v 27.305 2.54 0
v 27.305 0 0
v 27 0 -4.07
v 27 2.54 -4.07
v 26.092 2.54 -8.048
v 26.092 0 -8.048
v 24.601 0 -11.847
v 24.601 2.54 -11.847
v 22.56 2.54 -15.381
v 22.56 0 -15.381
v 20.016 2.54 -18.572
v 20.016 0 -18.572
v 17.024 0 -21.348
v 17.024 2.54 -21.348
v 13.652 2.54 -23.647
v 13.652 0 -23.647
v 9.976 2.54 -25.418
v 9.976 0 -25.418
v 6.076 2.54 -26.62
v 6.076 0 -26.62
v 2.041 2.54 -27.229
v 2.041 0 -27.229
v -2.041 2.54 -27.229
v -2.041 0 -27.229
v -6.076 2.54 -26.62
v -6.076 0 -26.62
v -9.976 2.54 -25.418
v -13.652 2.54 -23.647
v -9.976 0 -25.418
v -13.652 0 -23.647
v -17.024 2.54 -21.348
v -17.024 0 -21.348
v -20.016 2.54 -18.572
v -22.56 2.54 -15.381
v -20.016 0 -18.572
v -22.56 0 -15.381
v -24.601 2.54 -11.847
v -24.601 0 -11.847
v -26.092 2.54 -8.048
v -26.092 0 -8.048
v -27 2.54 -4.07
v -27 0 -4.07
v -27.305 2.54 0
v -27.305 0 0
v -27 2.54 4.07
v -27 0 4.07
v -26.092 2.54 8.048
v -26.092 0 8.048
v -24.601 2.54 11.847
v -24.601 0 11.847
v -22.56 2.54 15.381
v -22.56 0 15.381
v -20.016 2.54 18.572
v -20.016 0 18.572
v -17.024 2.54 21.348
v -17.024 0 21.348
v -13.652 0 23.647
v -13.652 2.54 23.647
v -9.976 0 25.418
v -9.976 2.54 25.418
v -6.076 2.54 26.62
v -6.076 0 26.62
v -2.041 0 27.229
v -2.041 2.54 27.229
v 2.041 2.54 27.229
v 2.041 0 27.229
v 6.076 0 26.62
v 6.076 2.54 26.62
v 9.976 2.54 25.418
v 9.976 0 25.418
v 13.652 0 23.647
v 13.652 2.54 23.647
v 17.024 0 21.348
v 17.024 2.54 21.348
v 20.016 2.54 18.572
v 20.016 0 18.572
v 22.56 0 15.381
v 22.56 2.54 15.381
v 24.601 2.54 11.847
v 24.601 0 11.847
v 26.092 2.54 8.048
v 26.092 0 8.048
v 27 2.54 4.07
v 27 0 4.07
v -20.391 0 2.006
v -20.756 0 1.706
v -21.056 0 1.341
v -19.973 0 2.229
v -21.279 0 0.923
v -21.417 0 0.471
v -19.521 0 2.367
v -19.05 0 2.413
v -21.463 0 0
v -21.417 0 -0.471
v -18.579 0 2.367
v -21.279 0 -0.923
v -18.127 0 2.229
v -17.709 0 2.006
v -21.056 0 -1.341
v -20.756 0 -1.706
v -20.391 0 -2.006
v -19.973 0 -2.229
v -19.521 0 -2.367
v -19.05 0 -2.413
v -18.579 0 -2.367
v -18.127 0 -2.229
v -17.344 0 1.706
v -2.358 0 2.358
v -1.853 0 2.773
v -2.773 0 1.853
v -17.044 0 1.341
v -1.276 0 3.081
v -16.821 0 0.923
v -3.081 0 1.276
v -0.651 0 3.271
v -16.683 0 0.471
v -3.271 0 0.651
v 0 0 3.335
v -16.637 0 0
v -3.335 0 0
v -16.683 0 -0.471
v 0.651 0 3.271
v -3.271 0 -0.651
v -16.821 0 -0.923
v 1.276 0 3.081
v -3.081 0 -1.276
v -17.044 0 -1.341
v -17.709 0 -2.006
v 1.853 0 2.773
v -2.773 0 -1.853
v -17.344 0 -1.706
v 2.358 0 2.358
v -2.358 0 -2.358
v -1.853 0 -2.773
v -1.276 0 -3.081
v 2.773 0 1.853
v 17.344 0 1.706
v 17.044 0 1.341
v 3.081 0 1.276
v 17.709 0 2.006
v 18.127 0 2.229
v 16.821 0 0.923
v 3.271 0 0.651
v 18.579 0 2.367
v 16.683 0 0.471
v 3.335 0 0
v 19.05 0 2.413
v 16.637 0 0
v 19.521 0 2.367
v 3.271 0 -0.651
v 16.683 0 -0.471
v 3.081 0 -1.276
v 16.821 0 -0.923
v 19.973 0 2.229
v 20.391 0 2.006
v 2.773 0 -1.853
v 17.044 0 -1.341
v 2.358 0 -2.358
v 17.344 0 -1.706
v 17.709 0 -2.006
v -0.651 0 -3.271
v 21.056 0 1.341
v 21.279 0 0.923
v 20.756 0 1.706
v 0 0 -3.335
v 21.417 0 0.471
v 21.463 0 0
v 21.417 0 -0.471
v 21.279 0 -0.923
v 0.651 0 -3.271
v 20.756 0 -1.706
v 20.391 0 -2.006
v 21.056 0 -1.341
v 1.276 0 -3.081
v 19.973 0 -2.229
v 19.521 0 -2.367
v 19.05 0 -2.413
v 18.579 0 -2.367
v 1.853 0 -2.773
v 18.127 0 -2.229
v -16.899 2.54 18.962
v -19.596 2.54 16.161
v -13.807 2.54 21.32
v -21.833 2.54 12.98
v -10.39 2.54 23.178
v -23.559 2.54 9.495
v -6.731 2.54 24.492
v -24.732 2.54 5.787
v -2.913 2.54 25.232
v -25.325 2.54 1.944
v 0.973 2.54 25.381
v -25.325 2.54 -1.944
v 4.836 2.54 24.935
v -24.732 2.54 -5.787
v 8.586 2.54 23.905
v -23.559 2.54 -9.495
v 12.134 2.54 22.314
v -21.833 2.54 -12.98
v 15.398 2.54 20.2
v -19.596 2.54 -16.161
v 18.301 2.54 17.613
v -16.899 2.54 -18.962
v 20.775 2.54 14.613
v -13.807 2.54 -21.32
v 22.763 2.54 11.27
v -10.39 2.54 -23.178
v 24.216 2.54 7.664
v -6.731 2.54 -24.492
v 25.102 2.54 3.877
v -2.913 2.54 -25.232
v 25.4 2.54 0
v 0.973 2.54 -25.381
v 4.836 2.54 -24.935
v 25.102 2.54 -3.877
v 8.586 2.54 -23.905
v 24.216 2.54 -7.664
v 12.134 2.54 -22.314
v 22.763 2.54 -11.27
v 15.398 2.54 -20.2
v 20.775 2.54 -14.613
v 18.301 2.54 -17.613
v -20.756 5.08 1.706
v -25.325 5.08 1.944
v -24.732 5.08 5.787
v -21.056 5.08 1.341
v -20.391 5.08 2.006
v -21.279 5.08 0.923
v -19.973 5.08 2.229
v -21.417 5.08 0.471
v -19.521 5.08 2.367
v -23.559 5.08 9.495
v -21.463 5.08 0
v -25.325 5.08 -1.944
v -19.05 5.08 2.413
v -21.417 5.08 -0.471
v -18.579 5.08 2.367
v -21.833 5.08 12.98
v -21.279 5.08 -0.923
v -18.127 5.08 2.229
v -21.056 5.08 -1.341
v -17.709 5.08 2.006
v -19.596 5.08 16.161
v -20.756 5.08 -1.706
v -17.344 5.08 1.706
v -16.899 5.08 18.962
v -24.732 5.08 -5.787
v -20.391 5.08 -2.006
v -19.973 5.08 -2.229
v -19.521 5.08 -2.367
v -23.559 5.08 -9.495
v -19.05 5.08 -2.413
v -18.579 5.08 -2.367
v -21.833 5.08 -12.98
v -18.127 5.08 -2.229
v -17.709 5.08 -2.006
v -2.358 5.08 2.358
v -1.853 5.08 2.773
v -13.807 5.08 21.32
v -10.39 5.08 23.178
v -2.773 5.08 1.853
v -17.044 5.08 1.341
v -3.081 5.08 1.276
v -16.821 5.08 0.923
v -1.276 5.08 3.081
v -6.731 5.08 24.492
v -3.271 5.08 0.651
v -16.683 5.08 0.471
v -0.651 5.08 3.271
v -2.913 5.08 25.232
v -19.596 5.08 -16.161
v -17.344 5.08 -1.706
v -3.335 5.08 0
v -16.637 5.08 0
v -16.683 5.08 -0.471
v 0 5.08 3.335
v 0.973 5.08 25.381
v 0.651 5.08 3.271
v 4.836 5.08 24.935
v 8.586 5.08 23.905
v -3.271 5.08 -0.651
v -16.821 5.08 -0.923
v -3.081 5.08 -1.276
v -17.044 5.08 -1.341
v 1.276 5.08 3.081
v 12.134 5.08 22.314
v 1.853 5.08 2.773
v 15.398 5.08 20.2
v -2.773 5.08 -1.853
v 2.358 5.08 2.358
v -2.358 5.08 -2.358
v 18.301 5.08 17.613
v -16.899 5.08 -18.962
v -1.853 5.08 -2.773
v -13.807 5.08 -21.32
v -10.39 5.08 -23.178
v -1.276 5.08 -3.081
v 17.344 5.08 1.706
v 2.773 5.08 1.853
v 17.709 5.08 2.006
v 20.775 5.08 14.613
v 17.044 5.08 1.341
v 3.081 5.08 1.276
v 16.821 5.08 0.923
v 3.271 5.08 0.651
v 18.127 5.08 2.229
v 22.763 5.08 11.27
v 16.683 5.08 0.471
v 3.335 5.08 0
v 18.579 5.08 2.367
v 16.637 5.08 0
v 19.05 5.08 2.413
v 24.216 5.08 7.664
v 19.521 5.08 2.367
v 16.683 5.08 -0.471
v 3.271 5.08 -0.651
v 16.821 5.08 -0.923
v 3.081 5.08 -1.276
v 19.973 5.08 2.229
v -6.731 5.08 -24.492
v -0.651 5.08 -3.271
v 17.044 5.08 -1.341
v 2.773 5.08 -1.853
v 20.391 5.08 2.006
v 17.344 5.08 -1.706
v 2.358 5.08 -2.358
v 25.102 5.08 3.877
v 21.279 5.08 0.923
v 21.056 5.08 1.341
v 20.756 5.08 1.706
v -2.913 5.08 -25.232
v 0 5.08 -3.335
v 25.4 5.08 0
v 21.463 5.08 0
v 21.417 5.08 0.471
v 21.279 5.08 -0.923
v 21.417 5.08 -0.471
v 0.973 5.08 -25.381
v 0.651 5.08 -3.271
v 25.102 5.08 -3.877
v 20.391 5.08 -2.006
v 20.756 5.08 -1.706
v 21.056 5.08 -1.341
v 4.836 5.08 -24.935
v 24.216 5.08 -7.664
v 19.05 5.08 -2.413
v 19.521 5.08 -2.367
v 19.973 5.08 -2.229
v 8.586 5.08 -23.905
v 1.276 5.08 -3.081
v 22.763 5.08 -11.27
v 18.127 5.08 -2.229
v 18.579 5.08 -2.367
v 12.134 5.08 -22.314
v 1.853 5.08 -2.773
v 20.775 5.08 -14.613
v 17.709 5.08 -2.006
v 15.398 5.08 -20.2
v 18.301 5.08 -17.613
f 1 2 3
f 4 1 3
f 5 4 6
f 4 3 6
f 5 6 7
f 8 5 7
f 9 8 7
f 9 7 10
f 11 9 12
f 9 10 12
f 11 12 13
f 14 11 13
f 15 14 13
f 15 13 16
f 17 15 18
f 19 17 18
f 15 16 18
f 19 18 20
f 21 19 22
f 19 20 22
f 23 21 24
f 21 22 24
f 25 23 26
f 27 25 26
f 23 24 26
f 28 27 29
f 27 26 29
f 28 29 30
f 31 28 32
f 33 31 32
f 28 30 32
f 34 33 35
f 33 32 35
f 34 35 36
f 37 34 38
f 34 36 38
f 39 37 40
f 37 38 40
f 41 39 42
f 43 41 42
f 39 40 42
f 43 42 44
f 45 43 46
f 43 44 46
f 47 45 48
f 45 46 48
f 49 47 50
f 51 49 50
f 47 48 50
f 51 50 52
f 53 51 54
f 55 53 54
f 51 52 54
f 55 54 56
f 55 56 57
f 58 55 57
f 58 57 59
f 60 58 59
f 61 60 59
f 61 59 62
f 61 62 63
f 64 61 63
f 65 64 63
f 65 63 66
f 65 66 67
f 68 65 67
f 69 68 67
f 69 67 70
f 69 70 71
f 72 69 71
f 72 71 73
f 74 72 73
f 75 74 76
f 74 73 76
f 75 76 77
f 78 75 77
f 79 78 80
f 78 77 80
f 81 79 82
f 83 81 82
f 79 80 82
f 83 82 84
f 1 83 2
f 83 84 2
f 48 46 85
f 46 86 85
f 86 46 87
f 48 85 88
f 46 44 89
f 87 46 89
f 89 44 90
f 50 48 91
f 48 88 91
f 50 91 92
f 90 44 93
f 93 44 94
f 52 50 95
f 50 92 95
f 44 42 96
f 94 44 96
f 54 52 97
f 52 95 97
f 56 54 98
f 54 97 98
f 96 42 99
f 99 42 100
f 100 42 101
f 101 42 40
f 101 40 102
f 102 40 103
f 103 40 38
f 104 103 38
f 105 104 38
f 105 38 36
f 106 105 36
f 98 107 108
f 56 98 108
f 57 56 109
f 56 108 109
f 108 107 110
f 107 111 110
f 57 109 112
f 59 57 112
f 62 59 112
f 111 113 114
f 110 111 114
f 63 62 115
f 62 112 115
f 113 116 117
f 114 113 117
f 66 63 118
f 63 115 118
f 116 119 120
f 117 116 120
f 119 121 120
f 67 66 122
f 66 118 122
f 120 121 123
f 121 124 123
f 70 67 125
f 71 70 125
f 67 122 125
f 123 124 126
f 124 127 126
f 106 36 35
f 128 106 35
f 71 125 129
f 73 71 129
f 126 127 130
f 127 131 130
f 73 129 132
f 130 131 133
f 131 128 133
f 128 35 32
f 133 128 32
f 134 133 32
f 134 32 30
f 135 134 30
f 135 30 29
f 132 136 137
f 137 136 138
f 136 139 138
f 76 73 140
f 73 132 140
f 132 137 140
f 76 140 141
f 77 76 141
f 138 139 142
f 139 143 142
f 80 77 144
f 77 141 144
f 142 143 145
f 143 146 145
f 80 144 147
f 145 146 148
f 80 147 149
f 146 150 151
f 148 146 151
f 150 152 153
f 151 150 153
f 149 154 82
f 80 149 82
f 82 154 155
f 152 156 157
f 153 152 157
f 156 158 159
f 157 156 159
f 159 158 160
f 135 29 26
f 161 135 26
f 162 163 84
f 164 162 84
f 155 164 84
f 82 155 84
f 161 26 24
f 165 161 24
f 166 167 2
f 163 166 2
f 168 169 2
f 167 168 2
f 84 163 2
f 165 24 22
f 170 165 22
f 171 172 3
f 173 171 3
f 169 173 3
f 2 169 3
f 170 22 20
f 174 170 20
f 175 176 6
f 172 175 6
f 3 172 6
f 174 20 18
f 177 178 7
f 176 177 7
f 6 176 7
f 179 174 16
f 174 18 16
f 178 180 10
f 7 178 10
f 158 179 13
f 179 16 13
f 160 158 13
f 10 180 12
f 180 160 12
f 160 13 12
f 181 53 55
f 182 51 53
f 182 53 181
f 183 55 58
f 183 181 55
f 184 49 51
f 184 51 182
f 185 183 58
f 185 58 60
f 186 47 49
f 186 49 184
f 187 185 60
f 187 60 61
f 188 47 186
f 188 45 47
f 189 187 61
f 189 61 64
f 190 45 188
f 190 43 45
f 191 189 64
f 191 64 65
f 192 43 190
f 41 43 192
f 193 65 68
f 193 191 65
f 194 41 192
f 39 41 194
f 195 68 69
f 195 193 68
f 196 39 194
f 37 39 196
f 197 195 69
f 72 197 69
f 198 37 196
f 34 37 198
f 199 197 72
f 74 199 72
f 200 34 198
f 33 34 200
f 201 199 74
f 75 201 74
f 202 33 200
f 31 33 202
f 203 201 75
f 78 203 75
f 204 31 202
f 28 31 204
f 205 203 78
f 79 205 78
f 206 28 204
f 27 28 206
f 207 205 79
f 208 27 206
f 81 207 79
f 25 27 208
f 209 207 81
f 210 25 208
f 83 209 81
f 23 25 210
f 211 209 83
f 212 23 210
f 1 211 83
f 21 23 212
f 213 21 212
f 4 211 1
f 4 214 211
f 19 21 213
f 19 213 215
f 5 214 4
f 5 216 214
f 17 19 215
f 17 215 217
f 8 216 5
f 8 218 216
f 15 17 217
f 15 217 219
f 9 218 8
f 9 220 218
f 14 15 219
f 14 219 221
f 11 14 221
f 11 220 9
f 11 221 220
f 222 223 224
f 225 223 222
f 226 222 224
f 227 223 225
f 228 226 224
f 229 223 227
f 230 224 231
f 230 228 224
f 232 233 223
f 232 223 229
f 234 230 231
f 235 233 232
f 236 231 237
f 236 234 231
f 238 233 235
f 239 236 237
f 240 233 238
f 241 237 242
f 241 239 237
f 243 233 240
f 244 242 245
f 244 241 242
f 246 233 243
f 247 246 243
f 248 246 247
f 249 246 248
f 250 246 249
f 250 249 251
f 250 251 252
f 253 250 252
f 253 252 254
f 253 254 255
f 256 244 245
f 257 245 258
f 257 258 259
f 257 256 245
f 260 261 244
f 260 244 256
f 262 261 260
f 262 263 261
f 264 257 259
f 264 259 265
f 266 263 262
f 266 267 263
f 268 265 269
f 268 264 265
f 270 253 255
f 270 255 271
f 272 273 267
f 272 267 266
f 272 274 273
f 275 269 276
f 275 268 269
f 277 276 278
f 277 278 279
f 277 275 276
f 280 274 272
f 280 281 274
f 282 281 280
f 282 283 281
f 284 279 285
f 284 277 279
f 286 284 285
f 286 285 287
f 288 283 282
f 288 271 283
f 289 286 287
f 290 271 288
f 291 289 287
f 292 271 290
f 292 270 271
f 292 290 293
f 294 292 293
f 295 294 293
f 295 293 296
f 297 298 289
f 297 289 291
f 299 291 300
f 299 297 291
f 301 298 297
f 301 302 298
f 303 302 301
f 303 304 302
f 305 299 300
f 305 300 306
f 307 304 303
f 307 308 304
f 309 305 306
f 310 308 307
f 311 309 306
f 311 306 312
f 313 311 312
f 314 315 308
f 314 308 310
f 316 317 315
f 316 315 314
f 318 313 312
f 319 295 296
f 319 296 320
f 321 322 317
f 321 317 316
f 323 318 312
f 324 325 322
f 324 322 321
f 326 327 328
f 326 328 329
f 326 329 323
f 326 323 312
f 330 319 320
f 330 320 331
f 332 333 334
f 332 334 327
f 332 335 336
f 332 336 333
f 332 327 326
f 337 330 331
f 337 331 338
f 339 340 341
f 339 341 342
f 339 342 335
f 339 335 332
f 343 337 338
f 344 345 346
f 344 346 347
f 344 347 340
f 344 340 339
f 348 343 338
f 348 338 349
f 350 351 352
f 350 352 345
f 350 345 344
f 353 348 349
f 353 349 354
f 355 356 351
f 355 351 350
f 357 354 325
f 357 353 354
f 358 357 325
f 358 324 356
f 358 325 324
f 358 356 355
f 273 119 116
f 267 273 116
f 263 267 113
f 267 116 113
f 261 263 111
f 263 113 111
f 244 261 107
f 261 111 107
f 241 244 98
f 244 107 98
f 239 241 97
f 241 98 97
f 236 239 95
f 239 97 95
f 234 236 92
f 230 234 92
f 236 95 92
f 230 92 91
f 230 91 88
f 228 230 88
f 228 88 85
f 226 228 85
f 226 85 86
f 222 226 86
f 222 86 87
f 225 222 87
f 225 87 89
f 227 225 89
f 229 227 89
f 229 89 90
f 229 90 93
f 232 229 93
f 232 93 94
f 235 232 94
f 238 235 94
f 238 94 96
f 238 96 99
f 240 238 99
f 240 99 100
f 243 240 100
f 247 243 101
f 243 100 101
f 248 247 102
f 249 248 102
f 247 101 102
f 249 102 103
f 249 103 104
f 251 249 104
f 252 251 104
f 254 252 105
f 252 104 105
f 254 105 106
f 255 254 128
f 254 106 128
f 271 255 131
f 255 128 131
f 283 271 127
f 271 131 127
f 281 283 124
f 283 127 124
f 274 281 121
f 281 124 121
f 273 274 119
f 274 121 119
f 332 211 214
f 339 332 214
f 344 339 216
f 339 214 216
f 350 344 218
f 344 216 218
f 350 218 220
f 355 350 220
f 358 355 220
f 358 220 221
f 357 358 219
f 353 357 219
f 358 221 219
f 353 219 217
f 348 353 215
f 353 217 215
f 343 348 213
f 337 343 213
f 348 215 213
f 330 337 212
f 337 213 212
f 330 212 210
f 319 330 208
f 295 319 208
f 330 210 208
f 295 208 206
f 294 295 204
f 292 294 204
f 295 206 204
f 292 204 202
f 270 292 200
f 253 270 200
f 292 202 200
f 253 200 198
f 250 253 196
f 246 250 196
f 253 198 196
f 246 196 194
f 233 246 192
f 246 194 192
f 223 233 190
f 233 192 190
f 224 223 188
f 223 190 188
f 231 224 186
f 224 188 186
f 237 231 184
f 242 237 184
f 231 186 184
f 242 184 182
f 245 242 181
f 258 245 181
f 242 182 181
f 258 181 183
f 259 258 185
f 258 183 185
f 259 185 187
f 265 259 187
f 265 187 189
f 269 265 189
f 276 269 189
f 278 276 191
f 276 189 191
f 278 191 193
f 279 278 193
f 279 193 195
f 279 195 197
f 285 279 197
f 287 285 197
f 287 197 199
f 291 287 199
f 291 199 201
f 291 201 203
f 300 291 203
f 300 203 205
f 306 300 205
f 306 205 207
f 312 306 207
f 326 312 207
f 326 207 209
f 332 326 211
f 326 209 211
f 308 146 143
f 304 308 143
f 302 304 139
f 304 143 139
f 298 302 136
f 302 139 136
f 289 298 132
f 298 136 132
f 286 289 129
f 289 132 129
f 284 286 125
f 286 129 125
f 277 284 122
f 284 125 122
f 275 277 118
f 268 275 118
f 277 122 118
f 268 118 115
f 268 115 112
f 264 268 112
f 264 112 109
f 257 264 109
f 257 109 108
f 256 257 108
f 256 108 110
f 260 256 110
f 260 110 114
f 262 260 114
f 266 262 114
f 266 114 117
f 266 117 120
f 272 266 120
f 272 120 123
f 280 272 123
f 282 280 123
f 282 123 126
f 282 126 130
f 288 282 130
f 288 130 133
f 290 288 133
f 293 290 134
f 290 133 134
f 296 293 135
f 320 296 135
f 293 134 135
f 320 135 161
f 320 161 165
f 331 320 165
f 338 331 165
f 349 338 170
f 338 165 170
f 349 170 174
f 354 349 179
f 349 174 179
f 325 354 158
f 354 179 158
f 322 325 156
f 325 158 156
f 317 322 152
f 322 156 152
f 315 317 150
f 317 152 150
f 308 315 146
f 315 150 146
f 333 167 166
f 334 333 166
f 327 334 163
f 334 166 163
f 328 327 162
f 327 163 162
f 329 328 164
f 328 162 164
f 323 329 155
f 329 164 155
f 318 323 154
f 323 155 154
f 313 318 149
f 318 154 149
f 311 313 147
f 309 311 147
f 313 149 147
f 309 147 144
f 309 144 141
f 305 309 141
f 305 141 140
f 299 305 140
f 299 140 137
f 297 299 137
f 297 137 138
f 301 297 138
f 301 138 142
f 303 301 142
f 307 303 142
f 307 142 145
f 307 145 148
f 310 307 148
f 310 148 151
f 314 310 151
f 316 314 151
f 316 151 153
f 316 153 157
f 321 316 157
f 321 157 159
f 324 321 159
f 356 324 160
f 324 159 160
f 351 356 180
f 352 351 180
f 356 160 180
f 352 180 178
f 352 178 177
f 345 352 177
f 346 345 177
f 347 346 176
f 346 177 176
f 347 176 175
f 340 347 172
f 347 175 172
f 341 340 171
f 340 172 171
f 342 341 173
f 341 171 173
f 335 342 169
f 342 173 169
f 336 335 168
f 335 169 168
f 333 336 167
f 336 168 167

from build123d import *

# Parameters (mm, degrees)
SKETCH1_R           = 27.305
BOSS_EXTRUDE1_DEPTH = 2.54
SKETCH2_R           = 25.4
BOSS_EXTRUDE2_DEPTH = 2.54
CUT_EXTRUDE1_REACH  = 7.08
SKETCH3_R           = 3.334616924
SKETCH3_R_2         = 2.413


with BuildPart() as part:
    # Sketch1 → Boss-Extrude1 (new body)
    with BuildSketch(Plane(origin=(0, 0, 0), x_dir=(1, 0, 0), z_dir=(0, 1, 0))):
        Circle(SKETCH1_R)
    extrude(amount=BOSS_EXTRUDE1_DEPTH)

    # Sketch2 → Boss-Extrude2 (add)
    with BuildSketch(Plane(origin=(0, 2.54, 0), x_dir=(1, 0, 0), z_dir=(0, 1, 0))):
        Circle(SKETCH2_R)
    extrude(amount=BOSS_EXTRUDE2_DEPTH)

    # Sketch3 → Cut-Extrude1 (cut, up to next)
    with BuildSketch(Plane.XZ, mode=Mode.PRIVATE) as cut_extrude1_sk1:
        Circle(SKETCH3_R)
    cut_extrude1_tool1 = extrude(cut_extrude1_sk1.sketch, amount=-CUT_EXTRUDE1_REACH, mode=Mode.PRIVATE) & part.part
    add(cut_extrude1_tool1.solids().sort_by_distance((0, 0, 0))[0], mode=Mode.SUBTRACT)
    # Sketch3 → Cut-Extrude1 (cut, up to next)
    with BuildSketch(Plane.XZ, mode=Mode.PRIVATE) as cut_extrude1_sk2:
        with Locations((-19.05, 0)):
            Circle(SKETCH3_R_2)
    cut_extrude1_tool2 = extrude(cut_extrude1_sk2.sketch, amount=-CUT_EXTRUDE1_REACH, mode=Mode.PRIVATE) & part.part
    add(cut_extrude1_tool2.solids().sort_by_distance((-19.05, 0, 0))[0], mode=Mode.SUBTRACT)
    # Sketch3 → Cut-Extrude1 (cut, up to next)
    with BuildSketch(Plane.XZ, mode=Mode.PRIVATE) as cut_extrude1_sk3:
        with Locations((19.05, 0)):
            Circle(SKETCH3_R_2)
    cut_extrude1_tool3 = extrude(cut_extrude1_sk3.sketch, amount=-CUT_EXTRUDE1_REACH, mode=Mode.PRIVATE) & part.part
    add(cut_extrude1_tool3.solids().sort_by_distance((19.05, 0, 0))[0], mode=Mode.SUBTRACT)


solid = part.part
